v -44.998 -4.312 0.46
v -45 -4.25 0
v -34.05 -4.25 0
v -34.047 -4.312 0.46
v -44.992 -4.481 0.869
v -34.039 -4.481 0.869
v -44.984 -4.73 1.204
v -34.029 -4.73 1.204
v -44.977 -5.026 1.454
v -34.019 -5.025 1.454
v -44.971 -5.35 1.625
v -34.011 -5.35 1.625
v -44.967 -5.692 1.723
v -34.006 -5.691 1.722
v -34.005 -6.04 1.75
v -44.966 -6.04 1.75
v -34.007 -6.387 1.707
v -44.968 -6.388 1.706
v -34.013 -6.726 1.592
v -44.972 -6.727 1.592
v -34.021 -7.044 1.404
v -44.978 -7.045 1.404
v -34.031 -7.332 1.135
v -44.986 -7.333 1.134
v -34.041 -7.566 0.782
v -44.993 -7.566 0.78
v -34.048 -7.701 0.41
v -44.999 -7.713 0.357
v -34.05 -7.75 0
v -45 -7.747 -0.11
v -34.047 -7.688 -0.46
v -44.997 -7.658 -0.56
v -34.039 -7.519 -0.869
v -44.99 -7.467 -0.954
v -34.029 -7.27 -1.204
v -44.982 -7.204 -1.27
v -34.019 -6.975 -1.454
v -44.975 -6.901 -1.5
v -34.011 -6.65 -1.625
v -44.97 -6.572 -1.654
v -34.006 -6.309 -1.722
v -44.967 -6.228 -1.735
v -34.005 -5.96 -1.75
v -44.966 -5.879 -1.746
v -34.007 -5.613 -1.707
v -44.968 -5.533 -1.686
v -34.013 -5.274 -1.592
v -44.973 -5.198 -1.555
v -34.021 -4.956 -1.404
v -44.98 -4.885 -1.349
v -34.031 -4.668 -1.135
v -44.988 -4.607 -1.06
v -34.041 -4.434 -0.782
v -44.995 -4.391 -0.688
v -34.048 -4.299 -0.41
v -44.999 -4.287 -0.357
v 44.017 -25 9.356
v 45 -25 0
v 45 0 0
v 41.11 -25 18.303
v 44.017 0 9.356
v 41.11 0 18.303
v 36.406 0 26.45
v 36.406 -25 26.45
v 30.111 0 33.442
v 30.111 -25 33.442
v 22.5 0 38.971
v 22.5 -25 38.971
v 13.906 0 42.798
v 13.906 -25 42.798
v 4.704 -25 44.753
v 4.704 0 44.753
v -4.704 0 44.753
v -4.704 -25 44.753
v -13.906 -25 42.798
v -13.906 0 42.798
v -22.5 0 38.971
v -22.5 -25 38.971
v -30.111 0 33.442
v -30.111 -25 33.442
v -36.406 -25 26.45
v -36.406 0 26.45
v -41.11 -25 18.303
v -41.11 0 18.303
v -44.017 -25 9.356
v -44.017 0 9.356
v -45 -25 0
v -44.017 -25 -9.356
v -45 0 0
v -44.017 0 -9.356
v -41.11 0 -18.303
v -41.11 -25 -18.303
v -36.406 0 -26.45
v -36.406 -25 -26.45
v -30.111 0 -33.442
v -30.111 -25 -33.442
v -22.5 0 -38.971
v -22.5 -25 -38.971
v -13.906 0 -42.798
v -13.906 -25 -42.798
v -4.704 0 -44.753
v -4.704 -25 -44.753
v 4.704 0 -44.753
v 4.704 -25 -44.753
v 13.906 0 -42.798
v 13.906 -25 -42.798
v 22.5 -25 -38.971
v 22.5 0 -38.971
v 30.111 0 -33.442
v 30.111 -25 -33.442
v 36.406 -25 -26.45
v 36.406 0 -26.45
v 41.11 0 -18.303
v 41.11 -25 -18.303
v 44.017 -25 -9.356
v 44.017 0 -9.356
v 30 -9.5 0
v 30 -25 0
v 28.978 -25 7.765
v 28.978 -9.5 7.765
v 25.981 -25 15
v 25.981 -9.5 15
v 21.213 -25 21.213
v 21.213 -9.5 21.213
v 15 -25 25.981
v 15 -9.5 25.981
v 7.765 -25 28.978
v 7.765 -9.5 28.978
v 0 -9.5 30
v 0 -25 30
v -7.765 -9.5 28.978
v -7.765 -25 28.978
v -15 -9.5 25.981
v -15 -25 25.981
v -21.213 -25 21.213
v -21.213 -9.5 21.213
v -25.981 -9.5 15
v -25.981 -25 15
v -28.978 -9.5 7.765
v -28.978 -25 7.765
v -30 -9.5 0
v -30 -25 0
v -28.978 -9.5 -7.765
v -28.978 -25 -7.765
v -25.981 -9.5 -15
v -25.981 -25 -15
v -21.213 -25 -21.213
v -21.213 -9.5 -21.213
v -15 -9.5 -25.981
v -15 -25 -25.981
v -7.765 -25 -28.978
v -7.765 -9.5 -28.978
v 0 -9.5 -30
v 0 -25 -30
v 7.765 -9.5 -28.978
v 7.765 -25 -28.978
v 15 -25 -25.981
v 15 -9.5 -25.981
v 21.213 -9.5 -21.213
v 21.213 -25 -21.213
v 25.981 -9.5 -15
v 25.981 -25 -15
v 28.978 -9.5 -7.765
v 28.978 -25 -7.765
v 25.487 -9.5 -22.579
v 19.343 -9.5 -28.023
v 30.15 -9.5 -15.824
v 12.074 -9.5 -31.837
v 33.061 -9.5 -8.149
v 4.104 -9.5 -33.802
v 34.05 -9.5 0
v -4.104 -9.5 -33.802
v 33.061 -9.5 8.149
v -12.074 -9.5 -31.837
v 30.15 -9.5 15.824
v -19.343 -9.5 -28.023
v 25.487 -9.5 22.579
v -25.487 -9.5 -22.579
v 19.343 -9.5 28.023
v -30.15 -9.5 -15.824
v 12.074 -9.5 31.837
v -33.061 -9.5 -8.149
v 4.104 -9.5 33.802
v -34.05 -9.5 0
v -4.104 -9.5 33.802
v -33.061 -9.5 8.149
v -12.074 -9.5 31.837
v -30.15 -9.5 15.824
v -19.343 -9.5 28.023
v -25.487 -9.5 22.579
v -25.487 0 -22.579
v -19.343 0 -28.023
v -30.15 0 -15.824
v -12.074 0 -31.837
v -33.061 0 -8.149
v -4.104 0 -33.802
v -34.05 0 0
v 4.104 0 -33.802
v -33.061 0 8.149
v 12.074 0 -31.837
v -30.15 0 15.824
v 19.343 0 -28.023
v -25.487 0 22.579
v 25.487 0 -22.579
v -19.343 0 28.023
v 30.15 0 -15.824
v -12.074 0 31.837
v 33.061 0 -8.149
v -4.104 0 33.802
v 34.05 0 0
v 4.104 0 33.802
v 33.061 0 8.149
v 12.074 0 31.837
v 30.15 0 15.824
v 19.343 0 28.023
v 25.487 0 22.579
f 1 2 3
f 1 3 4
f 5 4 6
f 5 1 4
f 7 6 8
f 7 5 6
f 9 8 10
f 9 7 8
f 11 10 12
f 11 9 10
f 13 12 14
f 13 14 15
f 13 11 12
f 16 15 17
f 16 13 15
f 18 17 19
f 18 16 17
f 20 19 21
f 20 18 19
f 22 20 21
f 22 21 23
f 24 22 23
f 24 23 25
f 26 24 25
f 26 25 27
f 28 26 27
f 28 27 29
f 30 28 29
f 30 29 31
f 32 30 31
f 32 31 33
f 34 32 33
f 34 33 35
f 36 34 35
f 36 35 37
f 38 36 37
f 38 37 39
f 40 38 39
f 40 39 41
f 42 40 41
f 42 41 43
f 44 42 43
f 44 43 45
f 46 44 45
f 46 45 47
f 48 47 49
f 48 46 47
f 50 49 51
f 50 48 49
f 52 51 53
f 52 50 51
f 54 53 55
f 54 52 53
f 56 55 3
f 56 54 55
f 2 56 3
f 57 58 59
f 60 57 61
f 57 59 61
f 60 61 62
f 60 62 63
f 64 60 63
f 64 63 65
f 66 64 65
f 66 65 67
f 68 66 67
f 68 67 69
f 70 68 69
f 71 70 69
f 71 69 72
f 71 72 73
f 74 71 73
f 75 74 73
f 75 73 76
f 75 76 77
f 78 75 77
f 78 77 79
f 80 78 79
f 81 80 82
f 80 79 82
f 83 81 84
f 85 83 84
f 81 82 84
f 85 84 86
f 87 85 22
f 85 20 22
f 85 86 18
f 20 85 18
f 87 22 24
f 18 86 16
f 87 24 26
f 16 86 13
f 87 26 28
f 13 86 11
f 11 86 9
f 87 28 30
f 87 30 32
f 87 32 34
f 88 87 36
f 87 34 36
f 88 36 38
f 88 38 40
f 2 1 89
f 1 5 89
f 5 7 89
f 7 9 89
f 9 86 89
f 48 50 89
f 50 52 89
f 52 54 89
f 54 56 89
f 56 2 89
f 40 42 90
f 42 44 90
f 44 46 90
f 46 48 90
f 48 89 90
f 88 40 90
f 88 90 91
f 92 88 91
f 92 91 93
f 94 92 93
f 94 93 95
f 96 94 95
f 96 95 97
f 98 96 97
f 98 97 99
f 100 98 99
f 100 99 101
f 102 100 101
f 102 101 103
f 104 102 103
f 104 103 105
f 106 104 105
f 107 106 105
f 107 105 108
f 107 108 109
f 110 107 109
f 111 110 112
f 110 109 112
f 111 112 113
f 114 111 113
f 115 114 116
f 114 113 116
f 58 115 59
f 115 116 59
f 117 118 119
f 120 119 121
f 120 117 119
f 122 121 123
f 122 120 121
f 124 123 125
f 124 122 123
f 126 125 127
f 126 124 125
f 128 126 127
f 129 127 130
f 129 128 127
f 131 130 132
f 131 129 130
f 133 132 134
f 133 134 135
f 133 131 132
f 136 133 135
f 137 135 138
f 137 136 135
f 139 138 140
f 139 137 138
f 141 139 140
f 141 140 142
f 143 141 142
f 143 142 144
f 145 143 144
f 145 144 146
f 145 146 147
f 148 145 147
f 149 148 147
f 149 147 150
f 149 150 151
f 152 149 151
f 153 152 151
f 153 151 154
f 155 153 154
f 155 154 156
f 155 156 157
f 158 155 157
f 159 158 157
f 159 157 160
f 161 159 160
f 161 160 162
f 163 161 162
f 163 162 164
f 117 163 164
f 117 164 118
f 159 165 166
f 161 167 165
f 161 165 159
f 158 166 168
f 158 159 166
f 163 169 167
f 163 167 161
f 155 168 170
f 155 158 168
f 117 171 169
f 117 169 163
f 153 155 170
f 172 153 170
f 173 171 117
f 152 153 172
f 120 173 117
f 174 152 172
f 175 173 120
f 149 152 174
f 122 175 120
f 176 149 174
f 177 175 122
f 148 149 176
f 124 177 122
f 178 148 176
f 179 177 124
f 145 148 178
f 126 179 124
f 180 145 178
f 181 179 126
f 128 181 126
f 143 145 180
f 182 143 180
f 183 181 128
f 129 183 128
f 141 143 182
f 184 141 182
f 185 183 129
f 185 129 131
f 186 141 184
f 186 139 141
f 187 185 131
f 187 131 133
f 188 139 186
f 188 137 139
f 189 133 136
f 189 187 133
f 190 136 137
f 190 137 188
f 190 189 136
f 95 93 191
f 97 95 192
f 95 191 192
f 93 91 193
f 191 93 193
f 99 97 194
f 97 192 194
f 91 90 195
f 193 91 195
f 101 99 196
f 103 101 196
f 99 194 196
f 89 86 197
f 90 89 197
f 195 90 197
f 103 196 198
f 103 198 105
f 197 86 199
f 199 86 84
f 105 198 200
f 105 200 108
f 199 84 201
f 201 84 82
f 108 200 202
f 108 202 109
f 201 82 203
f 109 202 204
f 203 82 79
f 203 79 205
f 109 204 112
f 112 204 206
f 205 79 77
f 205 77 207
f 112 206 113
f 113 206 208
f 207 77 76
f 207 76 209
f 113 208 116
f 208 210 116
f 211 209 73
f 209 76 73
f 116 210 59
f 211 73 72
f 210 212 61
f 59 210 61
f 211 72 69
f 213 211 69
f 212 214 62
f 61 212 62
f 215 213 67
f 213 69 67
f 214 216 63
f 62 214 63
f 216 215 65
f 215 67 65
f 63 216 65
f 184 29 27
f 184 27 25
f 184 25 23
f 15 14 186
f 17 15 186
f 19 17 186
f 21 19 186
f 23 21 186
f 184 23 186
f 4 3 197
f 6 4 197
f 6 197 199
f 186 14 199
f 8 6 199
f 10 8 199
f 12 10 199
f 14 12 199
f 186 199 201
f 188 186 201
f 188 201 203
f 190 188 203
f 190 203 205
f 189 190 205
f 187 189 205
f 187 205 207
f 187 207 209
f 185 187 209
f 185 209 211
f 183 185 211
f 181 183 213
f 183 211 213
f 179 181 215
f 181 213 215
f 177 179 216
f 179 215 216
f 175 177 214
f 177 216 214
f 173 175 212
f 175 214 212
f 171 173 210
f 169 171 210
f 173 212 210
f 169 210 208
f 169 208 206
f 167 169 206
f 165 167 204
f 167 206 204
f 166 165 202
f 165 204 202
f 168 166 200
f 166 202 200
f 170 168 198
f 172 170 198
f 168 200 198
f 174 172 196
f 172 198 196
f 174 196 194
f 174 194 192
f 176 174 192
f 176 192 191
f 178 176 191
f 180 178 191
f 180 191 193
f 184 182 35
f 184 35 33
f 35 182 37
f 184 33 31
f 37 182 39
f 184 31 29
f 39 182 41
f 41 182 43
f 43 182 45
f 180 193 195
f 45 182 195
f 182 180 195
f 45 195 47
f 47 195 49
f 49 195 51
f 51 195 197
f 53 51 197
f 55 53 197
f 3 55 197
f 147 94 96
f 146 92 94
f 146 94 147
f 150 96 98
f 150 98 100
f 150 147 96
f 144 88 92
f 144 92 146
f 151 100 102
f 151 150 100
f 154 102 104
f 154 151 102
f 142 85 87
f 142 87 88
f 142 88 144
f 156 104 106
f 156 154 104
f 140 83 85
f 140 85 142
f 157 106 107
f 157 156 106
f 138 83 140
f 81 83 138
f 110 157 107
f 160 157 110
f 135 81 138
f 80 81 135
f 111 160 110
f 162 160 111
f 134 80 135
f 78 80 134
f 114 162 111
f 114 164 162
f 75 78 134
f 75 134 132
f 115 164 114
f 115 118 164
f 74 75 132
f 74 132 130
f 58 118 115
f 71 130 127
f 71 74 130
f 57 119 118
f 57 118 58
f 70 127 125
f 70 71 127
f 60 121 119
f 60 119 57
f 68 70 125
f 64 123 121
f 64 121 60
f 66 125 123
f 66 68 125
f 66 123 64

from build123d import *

# Parameters (mm, degrees)
F0_R     = 45
F0_R_2   = 30
F1_DEPTH = 25
F2_R     = 34.05
F3_DEPTH = 9.5
F5_R     = 1.75
F6_DEPTH = 25


with BuildPart() as f1:
    # F0 (on Front) → F1 (new body)
    with BuildSketch(Plane.XZ):
        Circle(F0_R)
        Circle(F0_R_2, mode=Mode.SUBTRACT)
    extrude(amount=F1_DEPTH)

    # F2 (on face) → F3 (cut)
    with BuildSketch(Plane(origin=(0, 0, 0), x_dir=(-1, 0, 0), z_dir=(0, 1, 0))):
        Circle(F2_R)
    extrude(amount=-F3_DEPTH, mode=Mode.SUBTRACT)

    # F5 (on offset) → F6 (cut)
    with BuildSketch(Plane.YZ.offset(-45)):
        with Locations((-6, 0)):
            Circle(F5_R)
    extrude(amount=F6_DEPTH, mode=Mode.SUBTRACT)


solid = f1.part
